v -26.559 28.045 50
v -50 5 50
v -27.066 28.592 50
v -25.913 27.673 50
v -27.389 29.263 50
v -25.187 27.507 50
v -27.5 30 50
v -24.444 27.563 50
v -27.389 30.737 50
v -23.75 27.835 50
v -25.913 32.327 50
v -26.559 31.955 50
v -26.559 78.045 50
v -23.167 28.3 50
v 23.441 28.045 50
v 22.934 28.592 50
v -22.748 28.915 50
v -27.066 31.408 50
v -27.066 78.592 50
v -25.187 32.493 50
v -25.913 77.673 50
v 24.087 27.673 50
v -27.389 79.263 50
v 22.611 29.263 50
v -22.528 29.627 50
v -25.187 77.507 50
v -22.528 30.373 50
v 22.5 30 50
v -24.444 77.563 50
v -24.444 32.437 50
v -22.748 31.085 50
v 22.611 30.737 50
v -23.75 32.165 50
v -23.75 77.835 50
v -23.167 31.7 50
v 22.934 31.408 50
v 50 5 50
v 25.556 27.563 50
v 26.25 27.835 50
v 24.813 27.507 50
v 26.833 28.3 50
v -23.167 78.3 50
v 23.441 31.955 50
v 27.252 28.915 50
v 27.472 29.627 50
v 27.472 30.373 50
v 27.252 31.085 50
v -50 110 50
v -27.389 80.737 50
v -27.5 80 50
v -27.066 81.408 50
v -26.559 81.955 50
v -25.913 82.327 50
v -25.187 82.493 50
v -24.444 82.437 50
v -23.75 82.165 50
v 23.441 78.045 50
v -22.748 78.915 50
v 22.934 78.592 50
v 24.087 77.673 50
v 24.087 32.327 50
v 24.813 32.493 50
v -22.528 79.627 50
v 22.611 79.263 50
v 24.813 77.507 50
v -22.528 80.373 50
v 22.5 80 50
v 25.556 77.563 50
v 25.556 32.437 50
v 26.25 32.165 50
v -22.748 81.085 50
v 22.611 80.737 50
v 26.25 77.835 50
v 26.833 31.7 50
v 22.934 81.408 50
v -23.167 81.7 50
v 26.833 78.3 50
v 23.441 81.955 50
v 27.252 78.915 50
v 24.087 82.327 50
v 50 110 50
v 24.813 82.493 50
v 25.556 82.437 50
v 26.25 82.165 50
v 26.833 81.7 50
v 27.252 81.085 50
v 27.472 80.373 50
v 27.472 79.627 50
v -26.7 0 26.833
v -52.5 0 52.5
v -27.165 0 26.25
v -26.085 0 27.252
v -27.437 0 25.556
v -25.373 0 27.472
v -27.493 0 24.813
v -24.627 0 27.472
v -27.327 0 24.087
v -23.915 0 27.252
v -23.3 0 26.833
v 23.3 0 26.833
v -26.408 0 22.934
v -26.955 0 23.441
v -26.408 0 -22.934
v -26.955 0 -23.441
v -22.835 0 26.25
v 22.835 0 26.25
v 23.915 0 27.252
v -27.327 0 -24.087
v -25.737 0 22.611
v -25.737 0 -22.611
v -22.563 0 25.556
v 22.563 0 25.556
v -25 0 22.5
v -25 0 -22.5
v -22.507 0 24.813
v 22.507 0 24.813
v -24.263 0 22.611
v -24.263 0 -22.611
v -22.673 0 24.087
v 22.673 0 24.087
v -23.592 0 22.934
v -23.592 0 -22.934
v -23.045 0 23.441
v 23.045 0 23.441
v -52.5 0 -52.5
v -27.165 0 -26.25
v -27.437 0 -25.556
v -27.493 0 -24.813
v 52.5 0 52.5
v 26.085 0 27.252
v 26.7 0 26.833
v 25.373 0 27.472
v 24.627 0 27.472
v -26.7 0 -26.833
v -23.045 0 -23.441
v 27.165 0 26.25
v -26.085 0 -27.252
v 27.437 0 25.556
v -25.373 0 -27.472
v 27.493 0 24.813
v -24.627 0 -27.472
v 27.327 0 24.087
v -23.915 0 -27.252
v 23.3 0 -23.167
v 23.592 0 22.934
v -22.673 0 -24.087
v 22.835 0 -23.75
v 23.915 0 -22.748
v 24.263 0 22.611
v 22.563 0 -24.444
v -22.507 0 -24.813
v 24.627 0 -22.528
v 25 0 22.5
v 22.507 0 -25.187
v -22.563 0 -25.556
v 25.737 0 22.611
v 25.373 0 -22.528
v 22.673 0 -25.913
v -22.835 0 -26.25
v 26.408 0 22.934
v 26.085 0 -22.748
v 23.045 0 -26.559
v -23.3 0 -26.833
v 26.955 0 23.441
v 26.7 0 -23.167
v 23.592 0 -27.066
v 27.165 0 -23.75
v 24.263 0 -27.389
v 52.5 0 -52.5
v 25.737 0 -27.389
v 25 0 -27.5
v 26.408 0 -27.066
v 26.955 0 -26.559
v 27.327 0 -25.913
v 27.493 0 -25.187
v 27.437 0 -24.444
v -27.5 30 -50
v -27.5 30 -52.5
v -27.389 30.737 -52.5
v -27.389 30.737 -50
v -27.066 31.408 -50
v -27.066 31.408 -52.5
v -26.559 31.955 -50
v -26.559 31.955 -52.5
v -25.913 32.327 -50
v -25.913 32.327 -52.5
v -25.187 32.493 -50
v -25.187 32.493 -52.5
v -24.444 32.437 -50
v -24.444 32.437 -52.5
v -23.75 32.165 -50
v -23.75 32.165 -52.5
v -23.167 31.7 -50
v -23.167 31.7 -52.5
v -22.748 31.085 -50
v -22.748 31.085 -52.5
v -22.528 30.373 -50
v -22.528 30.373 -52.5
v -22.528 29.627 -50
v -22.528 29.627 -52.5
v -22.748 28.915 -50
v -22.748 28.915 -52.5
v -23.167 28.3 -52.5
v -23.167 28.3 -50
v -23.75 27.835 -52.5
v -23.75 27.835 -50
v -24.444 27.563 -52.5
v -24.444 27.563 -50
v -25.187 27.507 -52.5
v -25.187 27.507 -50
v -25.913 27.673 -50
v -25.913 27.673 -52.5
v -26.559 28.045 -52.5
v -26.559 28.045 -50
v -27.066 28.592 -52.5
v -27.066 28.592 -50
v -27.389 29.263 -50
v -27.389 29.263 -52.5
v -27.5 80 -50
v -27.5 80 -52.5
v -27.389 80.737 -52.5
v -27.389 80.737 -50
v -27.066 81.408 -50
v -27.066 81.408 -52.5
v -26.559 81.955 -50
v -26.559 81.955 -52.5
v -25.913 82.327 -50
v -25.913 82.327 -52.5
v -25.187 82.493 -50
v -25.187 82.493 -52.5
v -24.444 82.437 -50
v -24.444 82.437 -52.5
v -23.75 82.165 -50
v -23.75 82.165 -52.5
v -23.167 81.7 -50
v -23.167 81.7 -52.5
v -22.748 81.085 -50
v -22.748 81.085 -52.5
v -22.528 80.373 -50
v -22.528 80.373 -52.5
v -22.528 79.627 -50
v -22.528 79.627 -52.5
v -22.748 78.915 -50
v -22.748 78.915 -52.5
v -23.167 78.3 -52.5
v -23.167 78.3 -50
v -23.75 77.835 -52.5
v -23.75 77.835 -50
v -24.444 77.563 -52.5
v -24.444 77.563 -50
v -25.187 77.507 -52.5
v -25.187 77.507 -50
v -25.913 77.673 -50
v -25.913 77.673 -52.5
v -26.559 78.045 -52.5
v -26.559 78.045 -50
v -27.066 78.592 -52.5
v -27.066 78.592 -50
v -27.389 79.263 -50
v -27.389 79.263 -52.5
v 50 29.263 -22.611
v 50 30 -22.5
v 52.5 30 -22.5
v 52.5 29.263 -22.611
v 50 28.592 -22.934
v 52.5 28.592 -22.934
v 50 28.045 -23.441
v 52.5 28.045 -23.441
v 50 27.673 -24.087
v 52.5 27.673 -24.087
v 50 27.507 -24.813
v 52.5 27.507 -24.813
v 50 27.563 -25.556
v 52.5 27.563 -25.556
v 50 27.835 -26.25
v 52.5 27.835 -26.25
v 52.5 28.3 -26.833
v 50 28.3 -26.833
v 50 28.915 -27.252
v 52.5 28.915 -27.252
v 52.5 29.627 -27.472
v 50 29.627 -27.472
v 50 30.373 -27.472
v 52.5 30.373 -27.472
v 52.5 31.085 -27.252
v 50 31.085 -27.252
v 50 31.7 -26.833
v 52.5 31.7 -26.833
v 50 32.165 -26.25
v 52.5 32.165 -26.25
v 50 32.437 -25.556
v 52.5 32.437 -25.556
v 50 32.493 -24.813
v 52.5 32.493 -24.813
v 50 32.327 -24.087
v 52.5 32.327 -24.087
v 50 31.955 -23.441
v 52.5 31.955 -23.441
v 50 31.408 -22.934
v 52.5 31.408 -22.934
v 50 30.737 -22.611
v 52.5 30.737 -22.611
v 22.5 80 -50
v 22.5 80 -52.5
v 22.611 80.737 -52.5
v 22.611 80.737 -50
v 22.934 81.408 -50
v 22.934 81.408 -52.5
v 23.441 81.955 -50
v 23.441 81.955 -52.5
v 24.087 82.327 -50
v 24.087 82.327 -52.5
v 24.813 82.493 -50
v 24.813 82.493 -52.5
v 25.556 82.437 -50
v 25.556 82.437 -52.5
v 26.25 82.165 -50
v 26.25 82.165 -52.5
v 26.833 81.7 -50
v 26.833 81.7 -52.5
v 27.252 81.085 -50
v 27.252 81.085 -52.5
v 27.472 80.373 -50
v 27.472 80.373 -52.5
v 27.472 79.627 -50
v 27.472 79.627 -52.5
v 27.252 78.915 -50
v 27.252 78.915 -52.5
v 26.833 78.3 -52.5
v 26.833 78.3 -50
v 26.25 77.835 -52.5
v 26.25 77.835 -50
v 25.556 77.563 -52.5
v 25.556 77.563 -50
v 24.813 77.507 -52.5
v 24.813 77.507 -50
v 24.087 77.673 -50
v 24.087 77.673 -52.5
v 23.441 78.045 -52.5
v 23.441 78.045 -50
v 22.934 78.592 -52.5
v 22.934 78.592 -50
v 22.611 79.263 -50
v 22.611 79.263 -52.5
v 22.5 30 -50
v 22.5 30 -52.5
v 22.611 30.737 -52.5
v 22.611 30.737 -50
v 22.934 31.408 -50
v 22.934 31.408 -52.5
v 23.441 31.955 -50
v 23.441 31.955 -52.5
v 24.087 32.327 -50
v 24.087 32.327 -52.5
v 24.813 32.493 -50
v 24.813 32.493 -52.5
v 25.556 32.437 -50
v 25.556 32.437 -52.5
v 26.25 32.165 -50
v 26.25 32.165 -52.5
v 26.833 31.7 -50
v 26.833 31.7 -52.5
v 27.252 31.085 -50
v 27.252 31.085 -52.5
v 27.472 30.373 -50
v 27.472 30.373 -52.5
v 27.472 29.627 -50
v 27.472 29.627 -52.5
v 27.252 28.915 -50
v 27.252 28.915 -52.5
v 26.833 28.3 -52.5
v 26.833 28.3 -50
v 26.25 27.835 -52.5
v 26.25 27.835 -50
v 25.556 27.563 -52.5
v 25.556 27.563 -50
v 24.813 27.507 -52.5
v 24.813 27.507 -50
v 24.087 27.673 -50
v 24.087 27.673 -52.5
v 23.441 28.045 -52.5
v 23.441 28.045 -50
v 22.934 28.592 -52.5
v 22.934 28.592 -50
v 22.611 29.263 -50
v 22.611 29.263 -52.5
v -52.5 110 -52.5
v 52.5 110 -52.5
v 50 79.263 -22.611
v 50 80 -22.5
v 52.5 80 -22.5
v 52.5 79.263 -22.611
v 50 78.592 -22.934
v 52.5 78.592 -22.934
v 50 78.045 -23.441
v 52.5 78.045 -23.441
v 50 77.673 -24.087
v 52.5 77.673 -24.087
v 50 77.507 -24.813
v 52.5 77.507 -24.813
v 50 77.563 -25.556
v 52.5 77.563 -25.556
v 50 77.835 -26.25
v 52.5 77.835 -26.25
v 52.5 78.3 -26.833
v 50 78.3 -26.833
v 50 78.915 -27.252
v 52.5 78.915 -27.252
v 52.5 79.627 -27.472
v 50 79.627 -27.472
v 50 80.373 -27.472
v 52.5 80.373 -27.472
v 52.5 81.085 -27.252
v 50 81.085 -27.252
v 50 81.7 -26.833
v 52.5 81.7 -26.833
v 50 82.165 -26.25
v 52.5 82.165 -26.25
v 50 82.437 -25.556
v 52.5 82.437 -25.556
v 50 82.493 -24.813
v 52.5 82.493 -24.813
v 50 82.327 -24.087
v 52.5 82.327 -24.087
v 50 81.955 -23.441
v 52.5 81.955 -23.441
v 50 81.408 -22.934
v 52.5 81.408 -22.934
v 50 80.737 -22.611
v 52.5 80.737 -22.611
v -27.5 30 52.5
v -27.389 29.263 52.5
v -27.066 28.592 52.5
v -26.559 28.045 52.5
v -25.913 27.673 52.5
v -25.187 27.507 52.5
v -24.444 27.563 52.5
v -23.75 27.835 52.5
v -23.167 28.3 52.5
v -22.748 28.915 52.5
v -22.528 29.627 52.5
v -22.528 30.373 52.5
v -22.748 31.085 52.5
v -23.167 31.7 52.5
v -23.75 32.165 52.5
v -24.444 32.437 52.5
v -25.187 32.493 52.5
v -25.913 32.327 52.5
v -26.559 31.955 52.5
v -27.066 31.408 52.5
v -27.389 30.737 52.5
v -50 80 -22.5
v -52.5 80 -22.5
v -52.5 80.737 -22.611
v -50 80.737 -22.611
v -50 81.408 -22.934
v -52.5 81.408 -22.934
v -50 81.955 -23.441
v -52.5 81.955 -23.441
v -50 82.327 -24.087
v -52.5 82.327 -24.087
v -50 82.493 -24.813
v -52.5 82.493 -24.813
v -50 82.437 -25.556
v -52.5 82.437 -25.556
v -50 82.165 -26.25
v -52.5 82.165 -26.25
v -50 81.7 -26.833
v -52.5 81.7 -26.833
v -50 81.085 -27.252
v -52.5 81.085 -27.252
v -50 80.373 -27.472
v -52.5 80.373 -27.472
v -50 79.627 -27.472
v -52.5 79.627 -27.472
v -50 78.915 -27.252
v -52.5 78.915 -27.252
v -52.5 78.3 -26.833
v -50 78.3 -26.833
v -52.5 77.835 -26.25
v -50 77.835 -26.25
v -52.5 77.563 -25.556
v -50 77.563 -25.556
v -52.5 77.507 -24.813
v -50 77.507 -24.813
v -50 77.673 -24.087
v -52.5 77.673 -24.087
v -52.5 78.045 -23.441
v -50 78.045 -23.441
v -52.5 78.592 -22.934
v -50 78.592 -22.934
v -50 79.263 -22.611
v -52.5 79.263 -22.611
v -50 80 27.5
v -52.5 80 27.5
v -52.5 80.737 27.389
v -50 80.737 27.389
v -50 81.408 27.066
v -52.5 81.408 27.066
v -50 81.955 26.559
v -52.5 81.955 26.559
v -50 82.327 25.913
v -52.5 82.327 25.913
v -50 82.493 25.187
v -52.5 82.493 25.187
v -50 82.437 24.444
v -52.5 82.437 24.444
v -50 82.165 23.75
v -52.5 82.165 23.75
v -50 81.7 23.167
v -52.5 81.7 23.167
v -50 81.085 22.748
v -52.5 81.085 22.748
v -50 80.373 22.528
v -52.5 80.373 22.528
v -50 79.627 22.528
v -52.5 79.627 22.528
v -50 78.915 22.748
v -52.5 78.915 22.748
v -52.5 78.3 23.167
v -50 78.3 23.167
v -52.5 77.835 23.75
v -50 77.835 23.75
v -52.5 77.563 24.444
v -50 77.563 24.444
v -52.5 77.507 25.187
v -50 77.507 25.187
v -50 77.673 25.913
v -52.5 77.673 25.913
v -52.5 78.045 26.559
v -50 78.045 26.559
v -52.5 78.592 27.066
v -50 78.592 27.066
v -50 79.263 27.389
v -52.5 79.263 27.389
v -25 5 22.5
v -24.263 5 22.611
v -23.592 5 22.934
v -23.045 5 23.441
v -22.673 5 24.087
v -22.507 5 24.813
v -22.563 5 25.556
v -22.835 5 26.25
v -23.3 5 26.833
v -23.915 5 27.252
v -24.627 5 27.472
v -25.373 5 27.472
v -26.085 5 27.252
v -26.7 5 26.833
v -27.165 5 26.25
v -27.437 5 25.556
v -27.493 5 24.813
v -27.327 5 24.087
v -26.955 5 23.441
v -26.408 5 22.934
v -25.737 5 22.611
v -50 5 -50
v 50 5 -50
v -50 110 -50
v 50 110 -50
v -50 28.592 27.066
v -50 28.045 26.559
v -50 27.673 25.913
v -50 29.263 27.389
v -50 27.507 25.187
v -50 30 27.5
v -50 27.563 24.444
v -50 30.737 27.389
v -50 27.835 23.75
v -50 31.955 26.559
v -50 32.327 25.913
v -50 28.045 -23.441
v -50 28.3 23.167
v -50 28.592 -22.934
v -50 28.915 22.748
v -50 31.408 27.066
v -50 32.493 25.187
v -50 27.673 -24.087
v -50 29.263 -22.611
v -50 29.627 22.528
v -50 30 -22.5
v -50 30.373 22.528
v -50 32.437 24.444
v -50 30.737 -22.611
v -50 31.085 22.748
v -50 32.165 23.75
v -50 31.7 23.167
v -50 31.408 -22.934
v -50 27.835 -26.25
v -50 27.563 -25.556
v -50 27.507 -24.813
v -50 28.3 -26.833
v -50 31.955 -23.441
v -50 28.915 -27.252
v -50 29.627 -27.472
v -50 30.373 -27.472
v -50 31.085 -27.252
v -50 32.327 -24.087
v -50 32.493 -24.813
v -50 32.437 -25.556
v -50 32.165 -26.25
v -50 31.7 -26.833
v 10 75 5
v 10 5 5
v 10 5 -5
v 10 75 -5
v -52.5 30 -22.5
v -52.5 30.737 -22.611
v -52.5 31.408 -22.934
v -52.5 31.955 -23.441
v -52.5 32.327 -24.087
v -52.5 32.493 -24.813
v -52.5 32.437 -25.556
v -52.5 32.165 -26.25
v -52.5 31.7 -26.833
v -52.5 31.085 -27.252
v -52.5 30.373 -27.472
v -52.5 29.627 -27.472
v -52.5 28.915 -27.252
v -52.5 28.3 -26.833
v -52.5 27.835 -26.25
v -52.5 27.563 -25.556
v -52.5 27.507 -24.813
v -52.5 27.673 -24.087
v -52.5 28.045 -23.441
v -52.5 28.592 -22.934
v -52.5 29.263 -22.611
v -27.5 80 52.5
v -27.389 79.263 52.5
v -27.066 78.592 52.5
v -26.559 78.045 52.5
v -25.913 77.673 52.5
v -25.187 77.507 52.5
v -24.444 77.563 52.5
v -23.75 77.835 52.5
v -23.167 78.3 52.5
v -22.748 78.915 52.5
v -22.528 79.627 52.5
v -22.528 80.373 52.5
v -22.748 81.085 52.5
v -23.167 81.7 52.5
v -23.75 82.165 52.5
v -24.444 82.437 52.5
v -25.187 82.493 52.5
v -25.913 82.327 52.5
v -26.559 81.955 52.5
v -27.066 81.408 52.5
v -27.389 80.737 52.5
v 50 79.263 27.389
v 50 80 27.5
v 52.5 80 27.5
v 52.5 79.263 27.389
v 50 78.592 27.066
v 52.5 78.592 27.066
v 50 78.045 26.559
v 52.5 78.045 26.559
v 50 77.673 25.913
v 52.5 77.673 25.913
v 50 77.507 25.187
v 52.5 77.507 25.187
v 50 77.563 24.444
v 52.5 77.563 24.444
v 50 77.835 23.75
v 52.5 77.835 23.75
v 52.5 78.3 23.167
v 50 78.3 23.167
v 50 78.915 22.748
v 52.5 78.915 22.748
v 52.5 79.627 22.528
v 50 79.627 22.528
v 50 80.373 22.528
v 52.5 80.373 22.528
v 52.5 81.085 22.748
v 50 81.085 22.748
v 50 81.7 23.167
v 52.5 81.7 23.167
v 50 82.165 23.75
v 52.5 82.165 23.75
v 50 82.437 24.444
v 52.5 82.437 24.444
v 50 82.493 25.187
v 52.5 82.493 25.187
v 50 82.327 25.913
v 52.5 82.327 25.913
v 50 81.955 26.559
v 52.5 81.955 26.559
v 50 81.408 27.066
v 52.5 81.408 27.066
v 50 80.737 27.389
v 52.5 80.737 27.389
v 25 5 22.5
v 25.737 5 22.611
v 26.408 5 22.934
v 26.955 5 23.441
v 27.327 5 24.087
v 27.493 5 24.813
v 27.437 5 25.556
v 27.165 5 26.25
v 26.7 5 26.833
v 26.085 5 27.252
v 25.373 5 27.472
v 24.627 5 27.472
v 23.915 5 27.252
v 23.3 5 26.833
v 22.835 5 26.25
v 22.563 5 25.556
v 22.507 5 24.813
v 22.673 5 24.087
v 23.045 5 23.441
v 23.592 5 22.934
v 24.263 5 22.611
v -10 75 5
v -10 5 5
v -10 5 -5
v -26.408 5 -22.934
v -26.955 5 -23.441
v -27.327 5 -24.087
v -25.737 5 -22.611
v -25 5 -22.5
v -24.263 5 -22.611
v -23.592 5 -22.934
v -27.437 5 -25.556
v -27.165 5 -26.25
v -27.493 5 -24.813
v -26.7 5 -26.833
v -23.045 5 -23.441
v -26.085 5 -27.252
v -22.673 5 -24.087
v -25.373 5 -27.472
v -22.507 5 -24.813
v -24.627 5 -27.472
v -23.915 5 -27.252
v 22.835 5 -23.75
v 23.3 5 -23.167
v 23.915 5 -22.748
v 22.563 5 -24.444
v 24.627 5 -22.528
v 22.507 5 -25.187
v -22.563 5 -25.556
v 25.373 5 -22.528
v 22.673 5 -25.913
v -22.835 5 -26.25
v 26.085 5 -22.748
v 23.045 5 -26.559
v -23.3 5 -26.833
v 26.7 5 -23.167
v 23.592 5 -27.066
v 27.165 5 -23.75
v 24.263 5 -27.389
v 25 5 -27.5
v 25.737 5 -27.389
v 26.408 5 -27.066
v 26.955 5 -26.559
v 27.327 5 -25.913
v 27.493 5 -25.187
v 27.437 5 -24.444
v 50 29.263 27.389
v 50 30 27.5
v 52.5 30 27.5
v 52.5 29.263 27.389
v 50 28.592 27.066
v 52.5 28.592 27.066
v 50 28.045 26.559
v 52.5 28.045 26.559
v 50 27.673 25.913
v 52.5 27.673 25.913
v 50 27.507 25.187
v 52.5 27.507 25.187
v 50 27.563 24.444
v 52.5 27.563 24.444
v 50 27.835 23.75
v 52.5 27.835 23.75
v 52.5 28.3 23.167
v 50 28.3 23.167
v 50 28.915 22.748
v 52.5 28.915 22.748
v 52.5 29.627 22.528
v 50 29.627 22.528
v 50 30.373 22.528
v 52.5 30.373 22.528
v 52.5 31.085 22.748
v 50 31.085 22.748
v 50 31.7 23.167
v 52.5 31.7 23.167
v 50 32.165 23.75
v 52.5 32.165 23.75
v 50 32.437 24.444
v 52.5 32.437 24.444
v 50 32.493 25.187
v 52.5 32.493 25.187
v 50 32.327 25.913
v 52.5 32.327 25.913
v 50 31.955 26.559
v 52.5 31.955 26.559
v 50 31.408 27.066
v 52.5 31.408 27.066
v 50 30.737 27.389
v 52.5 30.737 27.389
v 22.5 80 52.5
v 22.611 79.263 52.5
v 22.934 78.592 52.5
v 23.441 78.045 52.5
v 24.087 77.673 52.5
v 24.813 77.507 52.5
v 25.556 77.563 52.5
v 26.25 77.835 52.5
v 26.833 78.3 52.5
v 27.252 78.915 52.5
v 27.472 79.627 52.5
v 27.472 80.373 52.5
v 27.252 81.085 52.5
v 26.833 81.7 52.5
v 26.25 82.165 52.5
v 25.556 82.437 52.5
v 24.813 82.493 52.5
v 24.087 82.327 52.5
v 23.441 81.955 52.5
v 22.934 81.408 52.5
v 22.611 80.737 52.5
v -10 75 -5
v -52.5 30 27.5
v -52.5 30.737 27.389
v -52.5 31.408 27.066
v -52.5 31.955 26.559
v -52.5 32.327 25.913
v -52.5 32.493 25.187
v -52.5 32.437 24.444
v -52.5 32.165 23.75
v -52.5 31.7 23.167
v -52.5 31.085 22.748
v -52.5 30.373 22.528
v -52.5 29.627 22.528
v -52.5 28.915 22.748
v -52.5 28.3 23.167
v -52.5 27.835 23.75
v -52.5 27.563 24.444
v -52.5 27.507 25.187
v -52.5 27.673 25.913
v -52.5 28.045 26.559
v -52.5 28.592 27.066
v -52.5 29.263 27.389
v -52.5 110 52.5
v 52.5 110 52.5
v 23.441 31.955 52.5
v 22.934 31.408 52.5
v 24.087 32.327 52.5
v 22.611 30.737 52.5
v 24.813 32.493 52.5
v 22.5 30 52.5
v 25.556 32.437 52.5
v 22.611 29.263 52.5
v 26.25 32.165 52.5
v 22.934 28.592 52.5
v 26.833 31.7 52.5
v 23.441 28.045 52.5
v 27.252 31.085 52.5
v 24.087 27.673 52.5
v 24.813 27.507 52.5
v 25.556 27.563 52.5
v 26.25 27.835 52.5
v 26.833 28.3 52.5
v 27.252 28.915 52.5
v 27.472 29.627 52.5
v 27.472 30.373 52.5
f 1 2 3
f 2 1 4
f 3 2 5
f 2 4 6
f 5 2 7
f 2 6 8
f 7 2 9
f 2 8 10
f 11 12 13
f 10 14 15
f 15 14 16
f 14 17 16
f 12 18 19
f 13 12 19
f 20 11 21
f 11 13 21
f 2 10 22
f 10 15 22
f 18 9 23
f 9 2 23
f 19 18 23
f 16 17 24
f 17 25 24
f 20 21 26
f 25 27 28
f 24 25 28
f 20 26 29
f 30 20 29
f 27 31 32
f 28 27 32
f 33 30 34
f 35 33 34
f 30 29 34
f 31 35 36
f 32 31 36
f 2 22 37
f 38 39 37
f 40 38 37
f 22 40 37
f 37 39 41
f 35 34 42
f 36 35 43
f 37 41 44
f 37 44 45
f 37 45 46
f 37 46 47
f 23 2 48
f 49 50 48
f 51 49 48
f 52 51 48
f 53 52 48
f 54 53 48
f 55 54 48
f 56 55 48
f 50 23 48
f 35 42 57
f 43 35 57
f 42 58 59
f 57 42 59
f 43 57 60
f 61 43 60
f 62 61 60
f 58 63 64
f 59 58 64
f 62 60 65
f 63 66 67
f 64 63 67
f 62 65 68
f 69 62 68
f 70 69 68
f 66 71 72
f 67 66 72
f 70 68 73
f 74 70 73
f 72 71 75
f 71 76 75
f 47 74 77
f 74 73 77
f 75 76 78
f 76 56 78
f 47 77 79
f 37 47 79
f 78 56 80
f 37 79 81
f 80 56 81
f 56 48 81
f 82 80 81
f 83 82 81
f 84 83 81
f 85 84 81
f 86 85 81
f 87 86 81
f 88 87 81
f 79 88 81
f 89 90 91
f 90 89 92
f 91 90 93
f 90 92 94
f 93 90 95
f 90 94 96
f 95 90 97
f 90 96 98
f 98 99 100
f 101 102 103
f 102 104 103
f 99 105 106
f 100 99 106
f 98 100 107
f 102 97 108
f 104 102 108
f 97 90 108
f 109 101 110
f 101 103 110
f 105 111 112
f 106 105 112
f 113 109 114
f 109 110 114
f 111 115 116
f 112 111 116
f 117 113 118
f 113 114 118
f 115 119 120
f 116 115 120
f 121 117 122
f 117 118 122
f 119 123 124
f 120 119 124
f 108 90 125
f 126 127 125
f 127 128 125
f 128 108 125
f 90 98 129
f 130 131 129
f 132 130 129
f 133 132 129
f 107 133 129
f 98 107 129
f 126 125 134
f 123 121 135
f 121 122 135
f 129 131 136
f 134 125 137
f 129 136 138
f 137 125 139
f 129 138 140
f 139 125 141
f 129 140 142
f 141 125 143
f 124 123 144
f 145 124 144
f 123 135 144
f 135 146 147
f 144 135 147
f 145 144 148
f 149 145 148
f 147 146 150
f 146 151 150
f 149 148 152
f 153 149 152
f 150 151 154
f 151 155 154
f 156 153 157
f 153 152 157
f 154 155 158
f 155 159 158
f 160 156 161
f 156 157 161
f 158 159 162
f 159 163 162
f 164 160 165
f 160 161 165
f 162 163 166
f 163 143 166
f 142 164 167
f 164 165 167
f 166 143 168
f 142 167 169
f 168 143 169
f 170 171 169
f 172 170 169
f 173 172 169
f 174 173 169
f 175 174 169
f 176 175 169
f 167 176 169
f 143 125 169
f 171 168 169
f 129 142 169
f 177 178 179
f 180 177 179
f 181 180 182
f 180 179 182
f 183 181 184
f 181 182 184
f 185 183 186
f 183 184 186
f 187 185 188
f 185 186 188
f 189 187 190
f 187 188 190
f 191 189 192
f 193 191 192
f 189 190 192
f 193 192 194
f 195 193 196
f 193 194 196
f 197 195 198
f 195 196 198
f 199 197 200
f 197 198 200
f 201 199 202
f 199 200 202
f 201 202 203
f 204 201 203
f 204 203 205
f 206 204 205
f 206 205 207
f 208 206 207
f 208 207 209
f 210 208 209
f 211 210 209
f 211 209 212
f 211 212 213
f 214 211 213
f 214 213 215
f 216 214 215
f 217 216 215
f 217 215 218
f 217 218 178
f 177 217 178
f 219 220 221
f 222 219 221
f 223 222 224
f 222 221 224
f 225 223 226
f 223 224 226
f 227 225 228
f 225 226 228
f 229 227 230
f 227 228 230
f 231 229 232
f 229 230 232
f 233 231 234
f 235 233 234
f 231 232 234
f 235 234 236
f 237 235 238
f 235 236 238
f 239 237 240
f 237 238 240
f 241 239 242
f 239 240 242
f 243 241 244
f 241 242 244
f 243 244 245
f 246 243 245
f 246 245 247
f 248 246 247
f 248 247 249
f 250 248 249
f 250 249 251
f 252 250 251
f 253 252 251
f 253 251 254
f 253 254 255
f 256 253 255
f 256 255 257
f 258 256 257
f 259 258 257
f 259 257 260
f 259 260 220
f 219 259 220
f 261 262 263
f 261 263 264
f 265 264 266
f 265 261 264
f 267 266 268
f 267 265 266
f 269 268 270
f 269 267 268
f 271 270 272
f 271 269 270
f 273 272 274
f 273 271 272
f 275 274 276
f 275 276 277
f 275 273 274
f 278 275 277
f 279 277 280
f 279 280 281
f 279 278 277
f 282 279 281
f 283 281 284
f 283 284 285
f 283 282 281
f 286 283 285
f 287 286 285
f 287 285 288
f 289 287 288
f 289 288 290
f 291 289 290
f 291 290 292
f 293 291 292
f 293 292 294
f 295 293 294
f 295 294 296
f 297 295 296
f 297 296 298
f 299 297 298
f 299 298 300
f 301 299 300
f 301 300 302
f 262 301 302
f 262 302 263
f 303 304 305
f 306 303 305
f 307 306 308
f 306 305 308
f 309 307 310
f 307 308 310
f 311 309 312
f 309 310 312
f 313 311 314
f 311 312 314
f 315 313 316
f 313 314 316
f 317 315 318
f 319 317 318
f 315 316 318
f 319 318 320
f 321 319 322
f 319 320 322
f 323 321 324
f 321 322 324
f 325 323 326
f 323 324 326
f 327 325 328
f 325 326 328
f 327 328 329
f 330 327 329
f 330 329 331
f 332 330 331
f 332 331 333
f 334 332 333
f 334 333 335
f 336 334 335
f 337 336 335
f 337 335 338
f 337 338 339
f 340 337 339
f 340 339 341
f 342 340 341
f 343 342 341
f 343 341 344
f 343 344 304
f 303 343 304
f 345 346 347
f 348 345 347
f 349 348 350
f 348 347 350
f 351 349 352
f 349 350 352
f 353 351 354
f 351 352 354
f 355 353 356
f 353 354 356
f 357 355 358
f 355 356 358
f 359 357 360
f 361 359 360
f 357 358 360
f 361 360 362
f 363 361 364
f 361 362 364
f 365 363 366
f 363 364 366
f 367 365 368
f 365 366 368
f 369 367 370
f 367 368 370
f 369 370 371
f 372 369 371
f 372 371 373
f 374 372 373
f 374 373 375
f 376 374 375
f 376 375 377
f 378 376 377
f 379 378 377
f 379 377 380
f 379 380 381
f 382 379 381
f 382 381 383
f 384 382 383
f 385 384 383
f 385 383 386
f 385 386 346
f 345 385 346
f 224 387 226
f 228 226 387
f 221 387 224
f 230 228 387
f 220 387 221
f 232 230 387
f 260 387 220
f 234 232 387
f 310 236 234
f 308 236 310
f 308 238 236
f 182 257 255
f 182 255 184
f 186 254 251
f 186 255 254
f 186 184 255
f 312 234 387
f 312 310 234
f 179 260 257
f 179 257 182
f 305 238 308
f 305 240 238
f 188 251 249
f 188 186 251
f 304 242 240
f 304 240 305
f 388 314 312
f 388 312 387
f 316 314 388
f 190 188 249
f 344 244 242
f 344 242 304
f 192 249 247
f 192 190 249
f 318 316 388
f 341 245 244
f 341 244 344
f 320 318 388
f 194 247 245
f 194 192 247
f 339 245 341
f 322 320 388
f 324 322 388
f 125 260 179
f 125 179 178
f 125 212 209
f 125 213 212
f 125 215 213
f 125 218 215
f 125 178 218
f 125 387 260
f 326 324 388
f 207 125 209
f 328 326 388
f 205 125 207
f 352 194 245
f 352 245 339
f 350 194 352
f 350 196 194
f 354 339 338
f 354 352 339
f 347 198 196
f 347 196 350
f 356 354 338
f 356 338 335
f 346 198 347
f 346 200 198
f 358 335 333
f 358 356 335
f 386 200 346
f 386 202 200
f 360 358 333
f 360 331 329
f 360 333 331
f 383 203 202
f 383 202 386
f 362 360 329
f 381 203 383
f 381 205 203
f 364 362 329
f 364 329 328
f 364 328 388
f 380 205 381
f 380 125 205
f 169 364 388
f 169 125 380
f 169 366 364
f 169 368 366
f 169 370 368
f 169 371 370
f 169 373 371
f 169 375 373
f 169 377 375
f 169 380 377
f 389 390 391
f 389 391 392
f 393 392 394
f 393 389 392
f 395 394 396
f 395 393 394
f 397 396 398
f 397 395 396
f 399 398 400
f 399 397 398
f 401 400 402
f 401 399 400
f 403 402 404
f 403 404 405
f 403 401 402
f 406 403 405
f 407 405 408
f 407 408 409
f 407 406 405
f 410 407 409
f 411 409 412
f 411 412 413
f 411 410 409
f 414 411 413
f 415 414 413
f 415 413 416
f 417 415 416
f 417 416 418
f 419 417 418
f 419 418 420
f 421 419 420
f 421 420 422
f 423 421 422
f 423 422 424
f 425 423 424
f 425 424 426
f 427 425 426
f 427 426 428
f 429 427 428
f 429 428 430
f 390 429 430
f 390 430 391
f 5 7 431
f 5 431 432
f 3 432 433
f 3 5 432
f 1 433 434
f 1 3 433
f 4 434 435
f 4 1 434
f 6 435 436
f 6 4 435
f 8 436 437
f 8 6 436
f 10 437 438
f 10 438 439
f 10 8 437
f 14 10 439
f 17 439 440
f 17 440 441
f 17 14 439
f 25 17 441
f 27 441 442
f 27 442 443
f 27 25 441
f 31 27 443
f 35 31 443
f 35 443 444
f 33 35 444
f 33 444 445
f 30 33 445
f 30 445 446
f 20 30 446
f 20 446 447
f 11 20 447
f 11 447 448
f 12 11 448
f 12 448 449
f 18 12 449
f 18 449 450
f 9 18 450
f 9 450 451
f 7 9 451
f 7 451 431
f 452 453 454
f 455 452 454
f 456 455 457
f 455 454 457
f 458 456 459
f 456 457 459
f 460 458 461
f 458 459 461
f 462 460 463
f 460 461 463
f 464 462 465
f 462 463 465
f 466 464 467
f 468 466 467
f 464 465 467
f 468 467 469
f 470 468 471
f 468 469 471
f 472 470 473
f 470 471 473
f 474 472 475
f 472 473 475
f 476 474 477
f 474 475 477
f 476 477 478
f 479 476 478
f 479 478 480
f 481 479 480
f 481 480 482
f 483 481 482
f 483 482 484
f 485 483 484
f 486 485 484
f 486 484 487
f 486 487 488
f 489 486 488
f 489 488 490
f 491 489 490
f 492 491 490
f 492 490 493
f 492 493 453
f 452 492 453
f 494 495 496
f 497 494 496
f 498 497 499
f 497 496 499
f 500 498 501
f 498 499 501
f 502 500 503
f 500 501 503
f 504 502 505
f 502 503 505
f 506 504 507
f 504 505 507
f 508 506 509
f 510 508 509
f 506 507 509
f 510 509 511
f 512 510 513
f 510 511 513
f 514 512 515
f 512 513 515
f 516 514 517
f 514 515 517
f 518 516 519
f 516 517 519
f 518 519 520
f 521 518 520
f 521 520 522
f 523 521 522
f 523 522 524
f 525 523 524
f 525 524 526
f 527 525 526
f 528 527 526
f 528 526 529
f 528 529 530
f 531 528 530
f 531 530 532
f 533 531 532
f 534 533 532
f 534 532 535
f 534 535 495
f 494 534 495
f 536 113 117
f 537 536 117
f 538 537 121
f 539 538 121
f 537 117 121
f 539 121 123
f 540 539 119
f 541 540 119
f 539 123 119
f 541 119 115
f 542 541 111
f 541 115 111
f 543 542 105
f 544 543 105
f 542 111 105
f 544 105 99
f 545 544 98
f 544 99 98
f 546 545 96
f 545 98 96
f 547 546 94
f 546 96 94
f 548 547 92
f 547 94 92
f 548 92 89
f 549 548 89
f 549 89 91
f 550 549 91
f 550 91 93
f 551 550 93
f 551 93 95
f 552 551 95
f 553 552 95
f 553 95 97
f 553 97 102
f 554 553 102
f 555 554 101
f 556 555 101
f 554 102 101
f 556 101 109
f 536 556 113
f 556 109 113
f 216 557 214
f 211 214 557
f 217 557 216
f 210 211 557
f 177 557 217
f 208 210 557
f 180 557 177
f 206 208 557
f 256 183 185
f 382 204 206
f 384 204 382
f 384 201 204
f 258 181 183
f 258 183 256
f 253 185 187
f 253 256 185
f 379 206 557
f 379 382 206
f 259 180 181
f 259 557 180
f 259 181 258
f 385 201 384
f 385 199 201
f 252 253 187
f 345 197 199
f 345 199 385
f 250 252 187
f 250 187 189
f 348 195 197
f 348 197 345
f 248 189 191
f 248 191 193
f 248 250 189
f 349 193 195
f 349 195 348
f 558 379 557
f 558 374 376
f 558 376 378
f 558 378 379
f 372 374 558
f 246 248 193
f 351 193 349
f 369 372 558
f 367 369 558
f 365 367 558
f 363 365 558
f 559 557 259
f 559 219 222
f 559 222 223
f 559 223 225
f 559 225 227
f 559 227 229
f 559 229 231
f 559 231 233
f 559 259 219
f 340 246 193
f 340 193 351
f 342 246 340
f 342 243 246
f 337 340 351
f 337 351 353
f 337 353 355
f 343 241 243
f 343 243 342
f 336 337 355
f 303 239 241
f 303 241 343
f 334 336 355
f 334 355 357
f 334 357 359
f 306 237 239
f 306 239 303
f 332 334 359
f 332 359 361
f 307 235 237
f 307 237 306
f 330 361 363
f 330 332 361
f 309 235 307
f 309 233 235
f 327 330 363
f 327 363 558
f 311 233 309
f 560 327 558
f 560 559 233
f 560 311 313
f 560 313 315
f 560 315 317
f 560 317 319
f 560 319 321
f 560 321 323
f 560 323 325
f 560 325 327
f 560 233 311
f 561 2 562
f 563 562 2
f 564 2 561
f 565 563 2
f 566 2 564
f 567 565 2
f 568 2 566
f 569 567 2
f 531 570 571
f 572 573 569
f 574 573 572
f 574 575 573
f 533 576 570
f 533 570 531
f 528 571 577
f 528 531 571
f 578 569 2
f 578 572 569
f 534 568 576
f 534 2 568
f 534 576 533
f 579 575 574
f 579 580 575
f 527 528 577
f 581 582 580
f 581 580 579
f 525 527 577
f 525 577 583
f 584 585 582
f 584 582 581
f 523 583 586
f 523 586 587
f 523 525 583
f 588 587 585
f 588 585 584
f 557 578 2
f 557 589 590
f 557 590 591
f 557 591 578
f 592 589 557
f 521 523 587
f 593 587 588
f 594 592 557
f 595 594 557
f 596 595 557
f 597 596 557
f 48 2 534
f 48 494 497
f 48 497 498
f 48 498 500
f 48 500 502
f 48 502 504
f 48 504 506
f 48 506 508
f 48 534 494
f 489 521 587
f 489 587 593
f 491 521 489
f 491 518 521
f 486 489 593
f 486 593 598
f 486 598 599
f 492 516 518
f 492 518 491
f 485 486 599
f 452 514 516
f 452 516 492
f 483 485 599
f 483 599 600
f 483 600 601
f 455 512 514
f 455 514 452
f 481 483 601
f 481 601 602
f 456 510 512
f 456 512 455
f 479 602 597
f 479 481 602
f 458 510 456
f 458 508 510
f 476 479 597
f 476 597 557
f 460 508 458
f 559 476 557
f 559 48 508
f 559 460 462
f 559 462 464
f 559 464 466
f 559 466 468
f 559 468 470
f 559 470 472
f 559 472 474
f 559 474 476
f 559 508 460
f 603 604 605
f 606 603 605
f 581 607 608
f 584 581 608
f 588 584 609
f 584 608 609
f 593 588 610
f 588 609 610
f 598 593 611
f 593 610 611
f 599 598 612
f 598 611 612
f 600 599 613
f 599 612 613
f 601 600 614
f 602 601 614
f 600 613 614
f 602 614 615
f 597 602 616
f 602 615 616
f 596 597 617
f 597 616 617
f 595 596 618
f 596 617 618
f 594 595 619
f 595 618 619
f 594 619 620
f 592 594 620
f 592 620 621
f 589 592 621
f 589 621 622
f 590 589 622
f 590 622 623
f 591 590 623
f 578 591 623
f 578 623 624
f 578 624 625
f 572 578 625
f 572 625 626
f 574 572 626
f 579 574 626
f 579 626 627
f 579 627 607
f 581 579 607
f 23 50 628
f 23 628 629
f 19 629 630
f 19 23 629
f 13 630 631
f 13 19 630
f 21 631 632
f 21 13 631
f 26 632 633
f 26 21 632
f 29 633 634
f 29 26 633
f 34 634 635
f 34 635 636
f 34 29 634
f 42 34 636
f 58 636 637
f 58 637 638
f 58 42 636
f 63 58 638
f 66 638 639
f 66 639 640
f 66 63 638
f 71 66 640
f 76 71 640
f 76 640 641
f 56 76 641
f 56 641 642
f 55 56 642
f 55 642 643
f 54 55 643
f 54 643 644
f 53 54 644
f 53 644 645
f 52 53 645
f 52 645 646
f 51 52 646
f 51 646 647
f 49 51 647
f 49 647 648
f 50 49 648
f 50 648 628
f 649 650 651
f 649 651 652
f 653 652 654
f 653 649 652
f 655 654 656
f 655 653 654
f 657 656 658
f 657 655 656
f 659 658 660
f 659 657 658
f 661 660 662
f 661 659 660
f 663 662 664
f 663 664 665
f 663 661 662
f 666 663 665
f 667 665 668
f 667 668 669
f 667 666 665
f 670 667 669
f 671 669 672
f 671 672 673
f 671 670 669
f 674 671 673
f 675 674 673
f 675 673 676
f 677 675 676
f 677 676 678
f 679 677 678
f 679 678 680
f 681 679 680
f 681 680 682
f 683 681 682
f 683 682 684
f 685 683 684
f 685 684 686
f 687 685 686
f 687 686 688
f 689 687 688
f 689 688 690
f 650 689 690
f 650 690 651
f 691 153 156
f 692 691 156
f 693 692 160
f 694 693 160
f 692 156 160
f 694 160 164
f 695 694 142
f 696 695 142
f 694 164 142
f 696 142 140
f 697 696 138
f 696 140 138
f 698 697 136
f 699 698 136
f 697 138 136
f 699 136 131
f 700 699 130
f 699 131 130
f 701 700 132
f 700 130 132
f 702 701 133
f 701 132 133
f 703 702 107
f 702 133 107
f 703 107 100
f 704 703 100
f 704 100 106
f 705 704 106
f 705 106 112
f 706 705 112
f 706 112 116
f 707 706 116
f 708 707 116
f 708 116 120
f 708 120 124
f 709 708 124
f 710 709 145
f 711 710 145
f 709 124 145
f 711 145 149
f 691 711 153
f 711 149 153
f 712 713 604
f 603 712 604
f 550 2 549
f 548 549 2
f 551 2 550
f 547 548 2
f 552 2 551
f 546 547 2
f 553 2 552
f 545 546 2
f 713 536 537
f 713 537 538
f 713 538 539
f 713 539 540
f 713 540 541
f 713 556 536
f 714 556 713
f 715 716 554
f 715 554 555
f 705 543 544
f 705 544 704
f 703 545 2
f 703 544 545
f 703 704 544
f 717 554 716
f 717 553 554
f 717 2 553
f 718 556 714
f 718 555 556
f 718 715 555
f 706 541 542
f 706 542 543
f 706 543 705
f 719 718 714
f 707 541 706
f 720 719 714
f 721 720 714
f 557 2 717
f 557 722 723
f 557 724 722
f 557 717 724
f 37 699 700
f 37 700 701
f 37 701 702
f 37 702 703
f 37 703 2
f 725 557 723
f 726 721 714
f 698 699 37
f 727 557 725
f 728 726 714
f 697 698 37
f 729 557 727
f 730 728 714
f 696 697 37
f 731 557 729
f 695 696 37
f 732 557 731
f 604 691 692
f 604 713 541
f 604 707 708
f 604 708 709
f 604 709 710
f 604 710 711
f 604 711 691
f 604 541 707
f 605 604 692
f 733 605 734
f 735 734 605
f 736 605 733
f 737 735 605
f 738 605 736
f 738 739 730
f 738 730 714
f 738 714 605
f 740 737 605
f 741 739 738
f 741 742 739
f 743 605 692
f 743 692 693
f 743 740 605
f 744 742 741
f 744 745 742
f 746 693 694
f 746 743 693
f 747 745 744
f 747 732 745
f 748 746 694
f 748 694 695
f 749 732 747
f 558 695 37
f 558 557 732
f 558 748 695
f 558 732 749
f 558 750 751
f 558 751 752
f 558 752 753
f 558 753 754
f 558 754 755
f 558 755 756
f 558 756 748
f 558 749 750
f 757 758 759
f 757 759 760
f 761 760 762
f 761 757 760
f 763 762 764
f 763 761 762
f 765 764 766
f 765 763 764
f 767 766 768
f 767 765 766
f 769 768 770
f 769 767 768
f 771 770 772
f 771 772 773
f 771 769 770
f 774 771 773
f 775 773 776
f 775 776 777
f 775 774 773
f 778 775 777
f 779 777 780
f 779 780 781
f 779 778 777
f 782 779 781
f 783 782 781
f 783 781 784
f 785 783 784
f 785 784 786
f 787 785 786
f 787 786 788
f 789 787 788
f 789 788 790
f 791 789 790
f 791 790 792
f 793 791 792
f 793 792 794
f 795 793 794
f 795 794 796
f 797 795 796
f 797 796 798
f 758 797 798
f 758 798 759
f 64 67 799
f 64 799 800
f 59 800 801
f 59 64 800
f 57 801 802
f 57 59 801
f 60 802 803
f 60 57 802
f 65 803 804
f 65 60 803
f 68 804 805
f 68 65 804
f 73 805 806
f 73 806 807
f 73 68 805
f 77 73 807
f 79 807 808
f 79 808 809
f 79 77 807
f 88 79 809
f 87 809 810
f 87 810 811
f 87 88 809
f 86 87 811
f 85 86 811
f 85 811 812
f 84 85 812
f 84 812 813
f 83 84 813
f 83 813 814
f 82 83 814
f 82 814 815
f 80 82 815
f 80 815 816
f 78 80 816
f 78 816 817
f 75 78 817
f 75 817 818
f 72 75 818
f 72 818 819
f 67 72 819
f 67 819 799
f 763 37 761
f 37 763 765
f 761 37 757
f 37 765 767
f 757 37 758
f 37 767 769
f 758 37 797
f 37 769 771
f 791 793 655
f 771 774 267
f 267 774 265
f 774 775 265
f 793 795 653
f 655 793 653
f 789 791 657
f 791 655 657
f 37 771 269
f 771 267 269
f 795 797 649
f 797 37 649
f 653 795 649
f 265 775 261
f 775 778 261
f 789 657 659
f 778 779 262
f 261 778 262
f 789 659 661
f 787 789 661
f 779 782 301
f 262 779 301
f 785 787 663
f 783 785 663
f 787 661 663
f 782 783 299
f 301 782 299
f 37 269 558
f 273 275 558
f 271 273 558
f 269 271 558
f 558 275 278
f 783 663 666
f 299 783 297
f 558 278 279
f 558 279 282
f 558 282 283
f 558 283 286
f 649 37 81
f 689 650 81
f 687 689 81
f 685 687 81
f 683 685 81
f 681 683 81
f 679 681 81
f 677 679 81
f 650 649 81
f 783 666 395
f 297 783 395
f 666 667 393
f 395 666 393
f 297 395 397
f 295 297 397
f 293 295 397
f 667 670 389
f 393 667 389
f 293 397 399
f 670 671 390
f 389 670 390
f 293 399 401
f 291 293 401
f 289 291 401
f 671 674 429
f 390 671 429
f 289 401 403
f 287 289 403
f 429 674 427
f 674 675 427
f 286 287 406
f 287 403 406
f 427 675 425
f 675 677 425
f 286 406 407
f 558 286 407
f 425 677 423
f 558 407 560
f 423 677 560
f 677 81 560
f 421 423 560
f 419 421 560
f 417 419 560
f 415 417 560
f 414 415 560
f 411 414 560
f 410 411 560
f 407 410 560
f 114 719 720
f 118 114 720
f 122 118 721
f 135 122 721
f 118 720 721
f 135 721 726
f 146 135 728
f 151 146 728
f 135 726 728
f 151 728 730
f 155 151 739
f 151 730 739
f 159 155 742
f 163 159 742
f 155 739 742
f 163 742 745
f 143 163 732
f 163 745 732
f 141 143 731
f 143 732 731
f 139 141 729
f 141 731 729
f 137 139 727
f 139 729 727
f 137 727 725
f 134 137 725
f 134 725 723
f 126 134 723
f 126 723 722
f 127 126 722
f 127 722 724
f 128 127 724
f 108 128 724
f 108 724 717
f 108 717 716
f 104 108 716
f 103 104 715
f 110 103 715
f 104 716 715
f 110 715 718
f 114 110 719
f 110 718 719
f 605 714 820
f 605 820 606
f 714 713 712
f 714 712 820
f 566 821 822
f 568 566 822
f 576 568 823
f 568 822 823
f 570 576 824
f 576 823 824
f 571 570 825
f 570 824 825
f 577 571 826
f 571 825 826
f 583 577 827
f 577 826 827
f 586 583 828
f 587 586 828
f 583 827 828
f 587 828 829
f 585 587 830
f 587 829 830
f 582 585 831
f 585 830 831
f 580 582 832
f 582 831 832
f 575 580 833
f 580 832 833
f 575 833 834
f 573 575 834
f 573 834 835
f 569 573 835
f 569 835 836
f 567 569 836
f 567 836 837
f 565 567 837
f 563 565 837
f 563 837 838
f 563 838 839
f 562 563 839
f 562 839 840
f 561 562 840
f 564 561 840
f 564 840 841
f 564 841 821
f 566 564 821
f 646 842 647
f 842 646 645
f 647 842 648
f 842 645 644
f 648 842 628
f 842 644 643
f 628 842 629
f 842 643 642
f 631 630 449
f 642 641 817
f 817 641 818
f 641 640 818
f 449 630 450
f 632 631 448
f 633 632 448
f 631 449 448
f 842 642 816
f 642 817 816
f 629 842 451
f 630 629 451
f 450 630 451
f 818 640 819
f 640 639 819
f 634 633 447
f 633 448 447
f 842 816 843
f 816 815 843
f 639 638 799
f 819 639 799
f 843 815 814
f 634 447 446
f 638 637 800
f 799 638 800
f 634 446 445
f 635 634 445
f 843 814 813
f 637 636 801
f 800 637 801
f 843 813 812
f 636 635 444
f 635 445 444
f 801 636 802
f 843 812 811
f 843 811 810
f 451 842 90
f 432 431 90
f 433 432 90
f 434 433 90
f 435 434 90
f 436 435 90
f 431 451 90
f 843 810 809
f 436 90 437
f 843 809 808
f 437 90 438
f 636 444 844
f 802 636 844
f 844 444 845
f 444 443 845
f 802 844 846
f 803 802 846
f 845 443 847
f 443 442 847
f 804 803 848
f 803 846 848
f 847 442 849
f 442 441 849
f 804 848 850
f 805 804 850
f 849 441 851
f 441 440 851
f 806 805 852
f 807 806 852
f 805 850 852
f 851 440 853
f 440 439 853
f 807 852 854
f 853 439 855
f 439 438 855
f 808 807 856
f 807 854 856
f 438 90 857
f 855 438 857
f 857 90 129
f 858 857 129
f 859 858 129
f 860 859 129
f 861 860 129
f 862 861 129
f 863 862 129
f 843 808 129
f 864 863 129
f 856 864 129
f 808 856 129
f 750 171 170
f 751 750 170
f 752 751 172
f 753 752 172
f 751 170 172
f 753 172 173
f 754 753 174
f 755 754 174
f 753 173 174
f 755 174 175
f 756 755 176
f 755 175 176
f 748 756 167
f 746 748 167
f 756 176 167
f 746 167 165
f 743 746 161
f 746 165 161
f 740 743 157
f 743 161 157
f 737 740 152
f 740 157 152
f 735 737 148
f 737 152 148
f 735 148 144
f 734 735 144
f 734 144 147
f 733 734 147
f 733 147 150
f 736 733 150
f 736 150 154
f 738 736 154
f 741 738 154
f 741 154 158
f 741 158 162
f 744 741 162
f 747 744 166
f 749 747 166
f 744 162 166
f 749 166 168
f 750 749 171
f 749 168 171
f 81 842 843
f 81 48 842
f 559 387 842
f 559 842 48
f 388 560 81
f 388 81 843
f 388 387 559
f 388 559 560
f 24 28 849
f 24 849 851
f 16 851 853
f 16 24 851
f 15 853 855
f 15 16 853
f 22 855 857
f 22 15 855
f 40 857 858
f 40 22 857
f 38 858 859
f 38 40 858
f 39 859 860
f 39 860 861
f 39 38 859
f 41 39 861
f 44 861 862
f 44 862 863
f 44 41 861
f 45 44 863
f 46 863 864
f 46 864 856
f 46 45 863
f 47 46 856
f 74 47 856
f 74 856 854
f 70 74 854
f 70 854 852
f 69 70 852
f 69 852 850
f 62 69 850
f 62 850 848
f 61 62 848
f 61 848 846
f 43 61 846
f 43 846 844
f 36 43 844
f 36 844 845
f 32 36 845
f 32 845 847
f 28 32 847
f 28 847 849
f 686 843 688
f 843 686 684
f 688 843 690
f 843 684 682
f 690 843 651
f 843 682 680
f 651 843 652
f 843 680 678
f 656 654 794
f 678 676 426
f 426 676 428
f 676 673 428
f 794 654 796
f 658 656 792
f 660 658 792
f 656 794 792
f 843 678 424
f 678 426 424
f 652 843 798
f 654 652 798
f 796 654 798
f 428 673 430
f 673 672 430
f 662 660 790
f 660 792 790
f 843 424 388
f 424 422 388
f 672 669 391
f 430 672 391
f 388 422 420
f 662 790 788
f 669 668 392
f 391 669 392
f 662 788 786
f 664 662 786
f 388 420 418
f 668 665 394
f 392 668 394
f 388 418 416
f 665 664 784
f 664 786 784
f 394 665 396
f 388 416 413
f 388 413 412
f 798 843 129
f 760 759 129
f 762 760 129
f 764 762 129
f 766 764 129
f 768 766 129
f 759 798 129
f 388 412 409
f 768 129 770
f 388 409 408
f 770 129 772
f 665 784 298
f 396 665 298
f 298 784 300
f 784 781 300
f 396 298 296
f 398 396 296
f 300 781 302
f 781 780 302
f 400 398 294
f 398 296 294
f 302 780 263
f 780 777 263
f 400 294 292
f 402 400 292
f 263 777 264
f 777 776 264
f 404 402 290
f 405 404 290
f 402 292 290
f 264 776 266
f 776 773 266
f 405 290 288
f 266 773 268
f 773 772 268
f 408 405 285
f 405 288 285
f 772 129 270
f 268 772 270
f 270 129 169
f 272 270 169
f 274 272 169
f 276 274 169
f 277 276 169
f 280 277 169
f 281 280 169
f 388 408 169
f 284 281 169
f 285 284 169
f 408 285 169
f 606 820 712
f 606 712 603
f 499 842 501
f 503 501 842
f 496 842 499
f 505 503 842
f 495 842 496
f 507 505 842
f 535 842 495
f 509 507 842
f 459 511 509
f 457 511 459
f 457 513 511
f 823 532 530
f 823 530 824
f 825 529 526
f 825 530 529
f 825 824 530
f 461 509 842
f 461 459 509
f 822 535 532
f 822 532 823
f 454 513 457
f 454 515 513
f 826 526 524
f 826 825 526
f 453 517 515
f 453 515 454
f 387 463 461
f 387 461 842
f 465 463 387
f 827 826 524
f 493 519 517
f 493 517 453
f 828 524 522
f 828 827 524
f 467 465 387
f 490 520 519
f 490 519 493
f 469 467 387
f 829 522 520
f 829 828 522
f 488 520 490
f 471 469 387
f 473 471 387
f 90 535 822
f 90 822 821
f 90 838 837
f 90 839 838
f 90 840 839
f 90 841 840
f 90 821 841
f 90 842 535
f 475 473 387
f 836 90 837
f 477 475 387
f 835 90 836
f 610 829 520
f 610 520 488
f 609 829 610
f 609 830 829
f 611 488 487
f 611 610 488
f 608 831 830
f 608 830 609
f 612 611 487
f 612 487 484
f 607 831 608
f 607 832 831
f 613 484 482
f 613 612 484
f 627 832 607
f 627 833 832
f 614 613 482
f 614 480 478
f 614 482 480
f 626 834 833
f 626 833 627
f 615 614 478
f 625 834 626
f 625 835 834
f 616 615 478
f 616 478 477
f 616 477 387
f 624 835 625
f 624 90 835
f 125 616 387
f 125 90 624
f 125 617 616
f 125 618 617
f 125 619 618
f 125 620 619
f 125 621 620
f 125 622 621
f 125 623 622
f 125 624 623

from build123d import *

# Parameters (mm, degrees)
SKETCH2_W           = 105
SKETCH2_H           = 105
BOSS_EXTRUDE2_DEPTH = 110
SKETCH3_W           = 100
SKETCH3_H           = 100
CUT_EXTRUDE1_DEPTH  = 105
SKETCH4_R           = 2.5
CUT_EXTRUDE2_DEPTH  = 5
SKETCH5_R           = 2.5
CUT_EXTRUDE3_DEPTH  = 5
SKETCH6_R           = 2.5
CUT_EXTRUDE4_DEPTH  = 5
SKETCH7_R           = 2.5
CUT_EXTRUDE5_DEPTH  = 5
SKETCH8_R           = 2.5
CUT_EXTRUDE12_DEPTH = 5
SKETCH13_R          = 2.5
CUT_EXTRUDE13_DEPTH = 5
SKETCH14_R          = 2.5
CUT_EXTRUDE14_DEPTH = 5
SKETCH15_R          = 2.5
CUT_EXTRUDE15_DEPTH = 5
SKETCH16_R          = 2.5
CUT_EXTRUDE16_DEPTH = 5
SKETCH17_R          = 2.5
CUT_EXTRUDE17_DEPTH = 5
SKETCH18_R          = 2.5
CUT_EXTRUDE18_DEPTH = 5
SKETCH19_R          = 2.5
CUT_EXTRUDE19_DEPTH = 5
CUT_EXTRUDE20_START = -5
SKETCH20_R          = 2.5
CUT_EXTRUDE20_DEPTH = 5
CUT_EXTRUDE21_START = -5
SKETCH21_R          = 2.5
CUT_EXTRUDE21_DEPTH = 5
CUT_EXTRUDE22_START = -5
SKETCH22_R          = 2.5
CUT_EXTRUDE22_DEPTH = 5
CUT_EXTRUDE23_START = -5
SKETCH23_R          = 2.5
CUT_EXTRUDE23_DEPTH = 5
CUT_EXTRUDE24_START = -5
SKETCH24_R          = 2.5
CUT_EXTRUDE24_DEPTH = 5
CUT_EXTRUDE25_START = -5
SKETCH25_R          = 2.5
CUT_EXTRUDE25_DEPTH = 5
CUT_EXTRUDE26_START = -5
SKETCH26_R          = 2.5
CUT_EXTRUDE26_DEPTH = 5
CUT_EXTRUDE27_START = -5
SKETCH27_R          = 2.5
CUT_EXTRUDE27_DEPTH = 5
SKETCH28_W          = 20
SKETCH28_H          = 10
BOSS_EXTRUDE3_DEPTH = 70


with BuildPart() as part:
    # Sketch2 → Boss-Extrude2 (new body)
    with BuildSketch(Plane(origin=(0, 0, 0), x_dir=(1, 0, 0), z_dir=(0, 1, 0))):
        Rectangle(SKETCH2_W, SKETCH2_H)
    extrude(amount=BOSS_EXTRUDE2_DEPTH)

    # Sketch3 → Cut-Extrude1 (cut)
    with BuildSketch(Plane(origin=(0, 110, 0), x_dir=(1, 0, 0), z_dir=(0, 1, 0))):
        Rectangle(SKETCH3_W, SKETCH3_H)
    extrude(amount=-CUT_EXTRUDE1_DEPTH, mode=Mode.SUBTRACT)

    # Sketch4 → Cut-Extrude2 (cut)
    with BuildSketch(Plane(origin=(0, 5, 0), x_dir=(1, 0, 0), z_dir=(0, 1, 0))):
        with Locations(Location((-25, 25, 0), (0, 0, 270))):
            Circle(SKETCH4_R)
    extrude(amount=-CUT_EXTRUDE2_DEPTH, mode=Mode.SUBTRACT)

    # Sketch5 → Cut-Extrude3 (cut)
    with BuildSketch(Plane.XZ):
        with Locations(Location((25, -25, 0), (0, 0, 270))):
            Circle(SKETCH5_R)
    extrude(amount=-CUT_EXTRUDE3_DEPTH, mode=Mode.SUBTRACT)

    # Sketch6 → Cut-Extrude4 (cut)
    with BuildSketch(Plane.XZ):
        with Locations(Location((25, 25, 0), (0, 0, 270))):
            Circle(SKETCH6_R)
    extrude(amount=-CUT_EXTRUDE4_DEPTH, mode=Mode.SUBTRACT)

    # Sketch7 → Cut-Extrude5 (cut)
    with BuildSketch(Plane.XZ):
        with Locations(Location((-25, 25, 0), (0, 0, 270))):
            Circle(SKETCH7_R)
    extrude(amount=-CUT_EXTRUDE5_DEPTH, mode=Mode.SUBTRACT)

    # Sketch8 → Cut-Extrude12 (cut)
    with BuildSketch(Plane.ZY.offset(52.5)):
        with Locations((-25, 80)):
            Circle(SKETCH8_R)
    extrude(amount=-CUT_EXTRUDE12_DEPTH, mode=Mode.SUBTRACT)

    # Sketch13 → Cut-Extrude13 (cut)
    with BuildSketch(Plane.ZY.offset(52.5)):
        with Locations((-25, 30)):
            Circle(SKETCH13_R)
    extrude(amount=-CUT_EXTRUDE13_DEPTH, mode=Mode.SUBTRACT)

    # Sketch14 → Cut-Extrude14 (cut)
    with BuildSketch(Plane.ZY.offset(52.5)):
        with Locations((25, 80)):
            Circle(SKETCH14_R)
    extrude(amount=-CUT_EXTRUDE14_DEPTH, mode=Mode.SUBTRACT)

    # Sketch15 → Cut-Extrude15 (cut)
    with BuildSketch(Plane.ZY.offset(52.5)):
        with Locations((25, 30)):
            Circle(SKETCH15_R)
    extrude(amount=-CUT_EXTRUDE15_DEPTH, mode=Mode.SUBTRACT)

    # Sketch16 → Cut-Extrude16 (cut)
    with BuildSketch(Plane(origin=(0, 0, -52.5), x_dir=(-1, 0, 0), z_dir=(0, 0, -1))):
        with Locations((25, 80)):
            Circle(SKETCH16_R)
    extrude(amount=-CUT_EXTRUDE16_DEPTH, mode=Mode.SUBTRACT)

    # Sketch17 → Cut-Extrude17 (cut)
    with BuildSketch(Plane(origin=(0, 0, -52.5), x_dir=(-1, 0, 0), z_dir=(0, 0, -1))):
        with Locations((25, 30)):
            Circle(SKETCH17_R)
    extrude(amount=-CUT_EXTRUDE17_DEPTH, mode=Mode.SUBTRACT)

    # Sketch18 → Cut-Extrude18 (cut)
    with BuildSketch(Plane(origin=(0, 0, -52.5), x_dir=(-1, 0, 0), z_dir=(0, 0, -1))):
        with Locations((-25, 80)):
            Circle(SKETCH18_R)
    extrude(amount=-CUT_EXTRUDE18_DEPTH, mode=Mode.SUBTRACT)

    # Sketch19 → Cut-Extrude19 (cut)
    with BuildSketch(Plane(origin=(0, 0, -52.5), x_dir=(-1, 0, 0), z_dir=(0, 0, -1))):
        with Locations((-25, 30)):
            Circle(SKETCH19_R)
    extrude(amount=-CUT_EXTRUDE19_DEPTH, mode=Mode.SUBTRACT)

    # Sketch20 → Cut-Extrude20 (cut)
    with BuildSketch(Plane(origin=(52.5, 0, 0), x_dir=(0, 0, -1), z_dir=(1, 0, 0)).offset(CUT_EXTRUDE20_START)):
        with Locations(Location((25, 80, 0), (0, 0, 180))):
            Circle(SKETCH20_R)
    extrude(amount=CUT_EXTRUDE20_DEPTH, mode=Mode.SUBTRACT)

    # Sketch21 → Cut-Extrude21 (cut)
    with BuildSketch(Plane(origin=(52.5, 0, 0), x_dir=(0, 0, -1), z_dir=(1, 0, 0)).offset(CUT_EXTRUDE21_START)):
        with Locations(Location((-25, 80, 0), (0, 0, 180))):
            Circle(SKETCH21_R)
    extrude(amount=CUT_EXTRUDE21_DEPTH, mode=Mode.SUBTRACT)

    # Sketch22 → Cut-Extrude22 (cut)
    with BuildSketch(Plane(origin=(52.5, 0, 0), x_dir=(0, 0, -1), z_dir=(1, 0, 0)).offset(CUT_EXTRUDE22_START)):
        with Locations(Location((25, 30, 0), (0, 0, 180))):
            Circle(SKETCH22_R)
    extrude(amount=CUT_EXTRUDE22_DEPTH, mode=Mode.SUBTRACT)

    # Sketch23 → Cut-Extrude23 (cut)
    with BuildSketch(Plane(origin=(52.5, 0, 0), x_dir=(0, 0, -1), z_dir=(1, 0, 0)).offset(CUT_EXTRUDE23_START)):
        with Locations(Location((-25, 30, 0), (0, 0, 180))):
            Circle(SKETCH23_R)
    extrude(amount=CUT_EXTRUDE23_DEPTH, mode=Mode.SUBTRACT)

    # Sketch24 → Cut-Extrude24 (cut)
    with BuildSketch(Plane.XY.offset(52.5).offset(CUT_EXTRUDE24_START)):
        with Locations(Location((-25, 80, 0), (0, 0, 180))):
            Circle(SKETCH24_R)
    extrude(amount=CUT_EXTRUDE24_DEPTH, mode=Mode.SUBTRACT)

    # Sketch25 → Cut-Extrude25 (cut)
    with BuildSketch(Plane.XY.offset(52.5).offset(CUT_EXTRUDE25_START)):
        with Locations(Location((25, 80, 0), (0, 0, 180))):
            Circle(SKETCH25_R)
    extrude(amount=CUT_EXTRUDE25_DEPTH, mode=Mode.SUBTRACT)

    # Sketch26 → Cut-Extrude26 (cut)
    with BuildSketch(Plane.XY.offset(52.5).offset(CUT_EXTRUDE26_START)):
        with Locations(Location((-25, 30, 0), (0, 0, 180))):
            Circle(SKETCH26_R)
    extrude(amount=CUT_EXTRUDE26_DEPTH, mode=Mode.SUBTRACT)

    # Sketch27 → Cut-Extrude27 (cut)
    with BuildSketch(Plane.XY.offset(52.5).offset(CUT_EXTRUDE27_START)):
        with Locations(Location((25, 30, 0), (0, 0, 180))):
            Circle(SKETCH27_R)
    extrude(amount=CUT_EXTRUDE27_DEPTH, mode=Mode.SUBTRACT)

    # Sketch28 → Boss-Extrude3 (add)
    with BuildSketch(Plane(origin=(0, 5, 0), x_dir=(1, 0, 0), z_dir=(0, 1, 0))):
        Rectangle(SKETCH28_W, SKETCH28_H)
    extrude(amount=BOSS_EXTRUDE3_DEPTH)


solid = part.part
